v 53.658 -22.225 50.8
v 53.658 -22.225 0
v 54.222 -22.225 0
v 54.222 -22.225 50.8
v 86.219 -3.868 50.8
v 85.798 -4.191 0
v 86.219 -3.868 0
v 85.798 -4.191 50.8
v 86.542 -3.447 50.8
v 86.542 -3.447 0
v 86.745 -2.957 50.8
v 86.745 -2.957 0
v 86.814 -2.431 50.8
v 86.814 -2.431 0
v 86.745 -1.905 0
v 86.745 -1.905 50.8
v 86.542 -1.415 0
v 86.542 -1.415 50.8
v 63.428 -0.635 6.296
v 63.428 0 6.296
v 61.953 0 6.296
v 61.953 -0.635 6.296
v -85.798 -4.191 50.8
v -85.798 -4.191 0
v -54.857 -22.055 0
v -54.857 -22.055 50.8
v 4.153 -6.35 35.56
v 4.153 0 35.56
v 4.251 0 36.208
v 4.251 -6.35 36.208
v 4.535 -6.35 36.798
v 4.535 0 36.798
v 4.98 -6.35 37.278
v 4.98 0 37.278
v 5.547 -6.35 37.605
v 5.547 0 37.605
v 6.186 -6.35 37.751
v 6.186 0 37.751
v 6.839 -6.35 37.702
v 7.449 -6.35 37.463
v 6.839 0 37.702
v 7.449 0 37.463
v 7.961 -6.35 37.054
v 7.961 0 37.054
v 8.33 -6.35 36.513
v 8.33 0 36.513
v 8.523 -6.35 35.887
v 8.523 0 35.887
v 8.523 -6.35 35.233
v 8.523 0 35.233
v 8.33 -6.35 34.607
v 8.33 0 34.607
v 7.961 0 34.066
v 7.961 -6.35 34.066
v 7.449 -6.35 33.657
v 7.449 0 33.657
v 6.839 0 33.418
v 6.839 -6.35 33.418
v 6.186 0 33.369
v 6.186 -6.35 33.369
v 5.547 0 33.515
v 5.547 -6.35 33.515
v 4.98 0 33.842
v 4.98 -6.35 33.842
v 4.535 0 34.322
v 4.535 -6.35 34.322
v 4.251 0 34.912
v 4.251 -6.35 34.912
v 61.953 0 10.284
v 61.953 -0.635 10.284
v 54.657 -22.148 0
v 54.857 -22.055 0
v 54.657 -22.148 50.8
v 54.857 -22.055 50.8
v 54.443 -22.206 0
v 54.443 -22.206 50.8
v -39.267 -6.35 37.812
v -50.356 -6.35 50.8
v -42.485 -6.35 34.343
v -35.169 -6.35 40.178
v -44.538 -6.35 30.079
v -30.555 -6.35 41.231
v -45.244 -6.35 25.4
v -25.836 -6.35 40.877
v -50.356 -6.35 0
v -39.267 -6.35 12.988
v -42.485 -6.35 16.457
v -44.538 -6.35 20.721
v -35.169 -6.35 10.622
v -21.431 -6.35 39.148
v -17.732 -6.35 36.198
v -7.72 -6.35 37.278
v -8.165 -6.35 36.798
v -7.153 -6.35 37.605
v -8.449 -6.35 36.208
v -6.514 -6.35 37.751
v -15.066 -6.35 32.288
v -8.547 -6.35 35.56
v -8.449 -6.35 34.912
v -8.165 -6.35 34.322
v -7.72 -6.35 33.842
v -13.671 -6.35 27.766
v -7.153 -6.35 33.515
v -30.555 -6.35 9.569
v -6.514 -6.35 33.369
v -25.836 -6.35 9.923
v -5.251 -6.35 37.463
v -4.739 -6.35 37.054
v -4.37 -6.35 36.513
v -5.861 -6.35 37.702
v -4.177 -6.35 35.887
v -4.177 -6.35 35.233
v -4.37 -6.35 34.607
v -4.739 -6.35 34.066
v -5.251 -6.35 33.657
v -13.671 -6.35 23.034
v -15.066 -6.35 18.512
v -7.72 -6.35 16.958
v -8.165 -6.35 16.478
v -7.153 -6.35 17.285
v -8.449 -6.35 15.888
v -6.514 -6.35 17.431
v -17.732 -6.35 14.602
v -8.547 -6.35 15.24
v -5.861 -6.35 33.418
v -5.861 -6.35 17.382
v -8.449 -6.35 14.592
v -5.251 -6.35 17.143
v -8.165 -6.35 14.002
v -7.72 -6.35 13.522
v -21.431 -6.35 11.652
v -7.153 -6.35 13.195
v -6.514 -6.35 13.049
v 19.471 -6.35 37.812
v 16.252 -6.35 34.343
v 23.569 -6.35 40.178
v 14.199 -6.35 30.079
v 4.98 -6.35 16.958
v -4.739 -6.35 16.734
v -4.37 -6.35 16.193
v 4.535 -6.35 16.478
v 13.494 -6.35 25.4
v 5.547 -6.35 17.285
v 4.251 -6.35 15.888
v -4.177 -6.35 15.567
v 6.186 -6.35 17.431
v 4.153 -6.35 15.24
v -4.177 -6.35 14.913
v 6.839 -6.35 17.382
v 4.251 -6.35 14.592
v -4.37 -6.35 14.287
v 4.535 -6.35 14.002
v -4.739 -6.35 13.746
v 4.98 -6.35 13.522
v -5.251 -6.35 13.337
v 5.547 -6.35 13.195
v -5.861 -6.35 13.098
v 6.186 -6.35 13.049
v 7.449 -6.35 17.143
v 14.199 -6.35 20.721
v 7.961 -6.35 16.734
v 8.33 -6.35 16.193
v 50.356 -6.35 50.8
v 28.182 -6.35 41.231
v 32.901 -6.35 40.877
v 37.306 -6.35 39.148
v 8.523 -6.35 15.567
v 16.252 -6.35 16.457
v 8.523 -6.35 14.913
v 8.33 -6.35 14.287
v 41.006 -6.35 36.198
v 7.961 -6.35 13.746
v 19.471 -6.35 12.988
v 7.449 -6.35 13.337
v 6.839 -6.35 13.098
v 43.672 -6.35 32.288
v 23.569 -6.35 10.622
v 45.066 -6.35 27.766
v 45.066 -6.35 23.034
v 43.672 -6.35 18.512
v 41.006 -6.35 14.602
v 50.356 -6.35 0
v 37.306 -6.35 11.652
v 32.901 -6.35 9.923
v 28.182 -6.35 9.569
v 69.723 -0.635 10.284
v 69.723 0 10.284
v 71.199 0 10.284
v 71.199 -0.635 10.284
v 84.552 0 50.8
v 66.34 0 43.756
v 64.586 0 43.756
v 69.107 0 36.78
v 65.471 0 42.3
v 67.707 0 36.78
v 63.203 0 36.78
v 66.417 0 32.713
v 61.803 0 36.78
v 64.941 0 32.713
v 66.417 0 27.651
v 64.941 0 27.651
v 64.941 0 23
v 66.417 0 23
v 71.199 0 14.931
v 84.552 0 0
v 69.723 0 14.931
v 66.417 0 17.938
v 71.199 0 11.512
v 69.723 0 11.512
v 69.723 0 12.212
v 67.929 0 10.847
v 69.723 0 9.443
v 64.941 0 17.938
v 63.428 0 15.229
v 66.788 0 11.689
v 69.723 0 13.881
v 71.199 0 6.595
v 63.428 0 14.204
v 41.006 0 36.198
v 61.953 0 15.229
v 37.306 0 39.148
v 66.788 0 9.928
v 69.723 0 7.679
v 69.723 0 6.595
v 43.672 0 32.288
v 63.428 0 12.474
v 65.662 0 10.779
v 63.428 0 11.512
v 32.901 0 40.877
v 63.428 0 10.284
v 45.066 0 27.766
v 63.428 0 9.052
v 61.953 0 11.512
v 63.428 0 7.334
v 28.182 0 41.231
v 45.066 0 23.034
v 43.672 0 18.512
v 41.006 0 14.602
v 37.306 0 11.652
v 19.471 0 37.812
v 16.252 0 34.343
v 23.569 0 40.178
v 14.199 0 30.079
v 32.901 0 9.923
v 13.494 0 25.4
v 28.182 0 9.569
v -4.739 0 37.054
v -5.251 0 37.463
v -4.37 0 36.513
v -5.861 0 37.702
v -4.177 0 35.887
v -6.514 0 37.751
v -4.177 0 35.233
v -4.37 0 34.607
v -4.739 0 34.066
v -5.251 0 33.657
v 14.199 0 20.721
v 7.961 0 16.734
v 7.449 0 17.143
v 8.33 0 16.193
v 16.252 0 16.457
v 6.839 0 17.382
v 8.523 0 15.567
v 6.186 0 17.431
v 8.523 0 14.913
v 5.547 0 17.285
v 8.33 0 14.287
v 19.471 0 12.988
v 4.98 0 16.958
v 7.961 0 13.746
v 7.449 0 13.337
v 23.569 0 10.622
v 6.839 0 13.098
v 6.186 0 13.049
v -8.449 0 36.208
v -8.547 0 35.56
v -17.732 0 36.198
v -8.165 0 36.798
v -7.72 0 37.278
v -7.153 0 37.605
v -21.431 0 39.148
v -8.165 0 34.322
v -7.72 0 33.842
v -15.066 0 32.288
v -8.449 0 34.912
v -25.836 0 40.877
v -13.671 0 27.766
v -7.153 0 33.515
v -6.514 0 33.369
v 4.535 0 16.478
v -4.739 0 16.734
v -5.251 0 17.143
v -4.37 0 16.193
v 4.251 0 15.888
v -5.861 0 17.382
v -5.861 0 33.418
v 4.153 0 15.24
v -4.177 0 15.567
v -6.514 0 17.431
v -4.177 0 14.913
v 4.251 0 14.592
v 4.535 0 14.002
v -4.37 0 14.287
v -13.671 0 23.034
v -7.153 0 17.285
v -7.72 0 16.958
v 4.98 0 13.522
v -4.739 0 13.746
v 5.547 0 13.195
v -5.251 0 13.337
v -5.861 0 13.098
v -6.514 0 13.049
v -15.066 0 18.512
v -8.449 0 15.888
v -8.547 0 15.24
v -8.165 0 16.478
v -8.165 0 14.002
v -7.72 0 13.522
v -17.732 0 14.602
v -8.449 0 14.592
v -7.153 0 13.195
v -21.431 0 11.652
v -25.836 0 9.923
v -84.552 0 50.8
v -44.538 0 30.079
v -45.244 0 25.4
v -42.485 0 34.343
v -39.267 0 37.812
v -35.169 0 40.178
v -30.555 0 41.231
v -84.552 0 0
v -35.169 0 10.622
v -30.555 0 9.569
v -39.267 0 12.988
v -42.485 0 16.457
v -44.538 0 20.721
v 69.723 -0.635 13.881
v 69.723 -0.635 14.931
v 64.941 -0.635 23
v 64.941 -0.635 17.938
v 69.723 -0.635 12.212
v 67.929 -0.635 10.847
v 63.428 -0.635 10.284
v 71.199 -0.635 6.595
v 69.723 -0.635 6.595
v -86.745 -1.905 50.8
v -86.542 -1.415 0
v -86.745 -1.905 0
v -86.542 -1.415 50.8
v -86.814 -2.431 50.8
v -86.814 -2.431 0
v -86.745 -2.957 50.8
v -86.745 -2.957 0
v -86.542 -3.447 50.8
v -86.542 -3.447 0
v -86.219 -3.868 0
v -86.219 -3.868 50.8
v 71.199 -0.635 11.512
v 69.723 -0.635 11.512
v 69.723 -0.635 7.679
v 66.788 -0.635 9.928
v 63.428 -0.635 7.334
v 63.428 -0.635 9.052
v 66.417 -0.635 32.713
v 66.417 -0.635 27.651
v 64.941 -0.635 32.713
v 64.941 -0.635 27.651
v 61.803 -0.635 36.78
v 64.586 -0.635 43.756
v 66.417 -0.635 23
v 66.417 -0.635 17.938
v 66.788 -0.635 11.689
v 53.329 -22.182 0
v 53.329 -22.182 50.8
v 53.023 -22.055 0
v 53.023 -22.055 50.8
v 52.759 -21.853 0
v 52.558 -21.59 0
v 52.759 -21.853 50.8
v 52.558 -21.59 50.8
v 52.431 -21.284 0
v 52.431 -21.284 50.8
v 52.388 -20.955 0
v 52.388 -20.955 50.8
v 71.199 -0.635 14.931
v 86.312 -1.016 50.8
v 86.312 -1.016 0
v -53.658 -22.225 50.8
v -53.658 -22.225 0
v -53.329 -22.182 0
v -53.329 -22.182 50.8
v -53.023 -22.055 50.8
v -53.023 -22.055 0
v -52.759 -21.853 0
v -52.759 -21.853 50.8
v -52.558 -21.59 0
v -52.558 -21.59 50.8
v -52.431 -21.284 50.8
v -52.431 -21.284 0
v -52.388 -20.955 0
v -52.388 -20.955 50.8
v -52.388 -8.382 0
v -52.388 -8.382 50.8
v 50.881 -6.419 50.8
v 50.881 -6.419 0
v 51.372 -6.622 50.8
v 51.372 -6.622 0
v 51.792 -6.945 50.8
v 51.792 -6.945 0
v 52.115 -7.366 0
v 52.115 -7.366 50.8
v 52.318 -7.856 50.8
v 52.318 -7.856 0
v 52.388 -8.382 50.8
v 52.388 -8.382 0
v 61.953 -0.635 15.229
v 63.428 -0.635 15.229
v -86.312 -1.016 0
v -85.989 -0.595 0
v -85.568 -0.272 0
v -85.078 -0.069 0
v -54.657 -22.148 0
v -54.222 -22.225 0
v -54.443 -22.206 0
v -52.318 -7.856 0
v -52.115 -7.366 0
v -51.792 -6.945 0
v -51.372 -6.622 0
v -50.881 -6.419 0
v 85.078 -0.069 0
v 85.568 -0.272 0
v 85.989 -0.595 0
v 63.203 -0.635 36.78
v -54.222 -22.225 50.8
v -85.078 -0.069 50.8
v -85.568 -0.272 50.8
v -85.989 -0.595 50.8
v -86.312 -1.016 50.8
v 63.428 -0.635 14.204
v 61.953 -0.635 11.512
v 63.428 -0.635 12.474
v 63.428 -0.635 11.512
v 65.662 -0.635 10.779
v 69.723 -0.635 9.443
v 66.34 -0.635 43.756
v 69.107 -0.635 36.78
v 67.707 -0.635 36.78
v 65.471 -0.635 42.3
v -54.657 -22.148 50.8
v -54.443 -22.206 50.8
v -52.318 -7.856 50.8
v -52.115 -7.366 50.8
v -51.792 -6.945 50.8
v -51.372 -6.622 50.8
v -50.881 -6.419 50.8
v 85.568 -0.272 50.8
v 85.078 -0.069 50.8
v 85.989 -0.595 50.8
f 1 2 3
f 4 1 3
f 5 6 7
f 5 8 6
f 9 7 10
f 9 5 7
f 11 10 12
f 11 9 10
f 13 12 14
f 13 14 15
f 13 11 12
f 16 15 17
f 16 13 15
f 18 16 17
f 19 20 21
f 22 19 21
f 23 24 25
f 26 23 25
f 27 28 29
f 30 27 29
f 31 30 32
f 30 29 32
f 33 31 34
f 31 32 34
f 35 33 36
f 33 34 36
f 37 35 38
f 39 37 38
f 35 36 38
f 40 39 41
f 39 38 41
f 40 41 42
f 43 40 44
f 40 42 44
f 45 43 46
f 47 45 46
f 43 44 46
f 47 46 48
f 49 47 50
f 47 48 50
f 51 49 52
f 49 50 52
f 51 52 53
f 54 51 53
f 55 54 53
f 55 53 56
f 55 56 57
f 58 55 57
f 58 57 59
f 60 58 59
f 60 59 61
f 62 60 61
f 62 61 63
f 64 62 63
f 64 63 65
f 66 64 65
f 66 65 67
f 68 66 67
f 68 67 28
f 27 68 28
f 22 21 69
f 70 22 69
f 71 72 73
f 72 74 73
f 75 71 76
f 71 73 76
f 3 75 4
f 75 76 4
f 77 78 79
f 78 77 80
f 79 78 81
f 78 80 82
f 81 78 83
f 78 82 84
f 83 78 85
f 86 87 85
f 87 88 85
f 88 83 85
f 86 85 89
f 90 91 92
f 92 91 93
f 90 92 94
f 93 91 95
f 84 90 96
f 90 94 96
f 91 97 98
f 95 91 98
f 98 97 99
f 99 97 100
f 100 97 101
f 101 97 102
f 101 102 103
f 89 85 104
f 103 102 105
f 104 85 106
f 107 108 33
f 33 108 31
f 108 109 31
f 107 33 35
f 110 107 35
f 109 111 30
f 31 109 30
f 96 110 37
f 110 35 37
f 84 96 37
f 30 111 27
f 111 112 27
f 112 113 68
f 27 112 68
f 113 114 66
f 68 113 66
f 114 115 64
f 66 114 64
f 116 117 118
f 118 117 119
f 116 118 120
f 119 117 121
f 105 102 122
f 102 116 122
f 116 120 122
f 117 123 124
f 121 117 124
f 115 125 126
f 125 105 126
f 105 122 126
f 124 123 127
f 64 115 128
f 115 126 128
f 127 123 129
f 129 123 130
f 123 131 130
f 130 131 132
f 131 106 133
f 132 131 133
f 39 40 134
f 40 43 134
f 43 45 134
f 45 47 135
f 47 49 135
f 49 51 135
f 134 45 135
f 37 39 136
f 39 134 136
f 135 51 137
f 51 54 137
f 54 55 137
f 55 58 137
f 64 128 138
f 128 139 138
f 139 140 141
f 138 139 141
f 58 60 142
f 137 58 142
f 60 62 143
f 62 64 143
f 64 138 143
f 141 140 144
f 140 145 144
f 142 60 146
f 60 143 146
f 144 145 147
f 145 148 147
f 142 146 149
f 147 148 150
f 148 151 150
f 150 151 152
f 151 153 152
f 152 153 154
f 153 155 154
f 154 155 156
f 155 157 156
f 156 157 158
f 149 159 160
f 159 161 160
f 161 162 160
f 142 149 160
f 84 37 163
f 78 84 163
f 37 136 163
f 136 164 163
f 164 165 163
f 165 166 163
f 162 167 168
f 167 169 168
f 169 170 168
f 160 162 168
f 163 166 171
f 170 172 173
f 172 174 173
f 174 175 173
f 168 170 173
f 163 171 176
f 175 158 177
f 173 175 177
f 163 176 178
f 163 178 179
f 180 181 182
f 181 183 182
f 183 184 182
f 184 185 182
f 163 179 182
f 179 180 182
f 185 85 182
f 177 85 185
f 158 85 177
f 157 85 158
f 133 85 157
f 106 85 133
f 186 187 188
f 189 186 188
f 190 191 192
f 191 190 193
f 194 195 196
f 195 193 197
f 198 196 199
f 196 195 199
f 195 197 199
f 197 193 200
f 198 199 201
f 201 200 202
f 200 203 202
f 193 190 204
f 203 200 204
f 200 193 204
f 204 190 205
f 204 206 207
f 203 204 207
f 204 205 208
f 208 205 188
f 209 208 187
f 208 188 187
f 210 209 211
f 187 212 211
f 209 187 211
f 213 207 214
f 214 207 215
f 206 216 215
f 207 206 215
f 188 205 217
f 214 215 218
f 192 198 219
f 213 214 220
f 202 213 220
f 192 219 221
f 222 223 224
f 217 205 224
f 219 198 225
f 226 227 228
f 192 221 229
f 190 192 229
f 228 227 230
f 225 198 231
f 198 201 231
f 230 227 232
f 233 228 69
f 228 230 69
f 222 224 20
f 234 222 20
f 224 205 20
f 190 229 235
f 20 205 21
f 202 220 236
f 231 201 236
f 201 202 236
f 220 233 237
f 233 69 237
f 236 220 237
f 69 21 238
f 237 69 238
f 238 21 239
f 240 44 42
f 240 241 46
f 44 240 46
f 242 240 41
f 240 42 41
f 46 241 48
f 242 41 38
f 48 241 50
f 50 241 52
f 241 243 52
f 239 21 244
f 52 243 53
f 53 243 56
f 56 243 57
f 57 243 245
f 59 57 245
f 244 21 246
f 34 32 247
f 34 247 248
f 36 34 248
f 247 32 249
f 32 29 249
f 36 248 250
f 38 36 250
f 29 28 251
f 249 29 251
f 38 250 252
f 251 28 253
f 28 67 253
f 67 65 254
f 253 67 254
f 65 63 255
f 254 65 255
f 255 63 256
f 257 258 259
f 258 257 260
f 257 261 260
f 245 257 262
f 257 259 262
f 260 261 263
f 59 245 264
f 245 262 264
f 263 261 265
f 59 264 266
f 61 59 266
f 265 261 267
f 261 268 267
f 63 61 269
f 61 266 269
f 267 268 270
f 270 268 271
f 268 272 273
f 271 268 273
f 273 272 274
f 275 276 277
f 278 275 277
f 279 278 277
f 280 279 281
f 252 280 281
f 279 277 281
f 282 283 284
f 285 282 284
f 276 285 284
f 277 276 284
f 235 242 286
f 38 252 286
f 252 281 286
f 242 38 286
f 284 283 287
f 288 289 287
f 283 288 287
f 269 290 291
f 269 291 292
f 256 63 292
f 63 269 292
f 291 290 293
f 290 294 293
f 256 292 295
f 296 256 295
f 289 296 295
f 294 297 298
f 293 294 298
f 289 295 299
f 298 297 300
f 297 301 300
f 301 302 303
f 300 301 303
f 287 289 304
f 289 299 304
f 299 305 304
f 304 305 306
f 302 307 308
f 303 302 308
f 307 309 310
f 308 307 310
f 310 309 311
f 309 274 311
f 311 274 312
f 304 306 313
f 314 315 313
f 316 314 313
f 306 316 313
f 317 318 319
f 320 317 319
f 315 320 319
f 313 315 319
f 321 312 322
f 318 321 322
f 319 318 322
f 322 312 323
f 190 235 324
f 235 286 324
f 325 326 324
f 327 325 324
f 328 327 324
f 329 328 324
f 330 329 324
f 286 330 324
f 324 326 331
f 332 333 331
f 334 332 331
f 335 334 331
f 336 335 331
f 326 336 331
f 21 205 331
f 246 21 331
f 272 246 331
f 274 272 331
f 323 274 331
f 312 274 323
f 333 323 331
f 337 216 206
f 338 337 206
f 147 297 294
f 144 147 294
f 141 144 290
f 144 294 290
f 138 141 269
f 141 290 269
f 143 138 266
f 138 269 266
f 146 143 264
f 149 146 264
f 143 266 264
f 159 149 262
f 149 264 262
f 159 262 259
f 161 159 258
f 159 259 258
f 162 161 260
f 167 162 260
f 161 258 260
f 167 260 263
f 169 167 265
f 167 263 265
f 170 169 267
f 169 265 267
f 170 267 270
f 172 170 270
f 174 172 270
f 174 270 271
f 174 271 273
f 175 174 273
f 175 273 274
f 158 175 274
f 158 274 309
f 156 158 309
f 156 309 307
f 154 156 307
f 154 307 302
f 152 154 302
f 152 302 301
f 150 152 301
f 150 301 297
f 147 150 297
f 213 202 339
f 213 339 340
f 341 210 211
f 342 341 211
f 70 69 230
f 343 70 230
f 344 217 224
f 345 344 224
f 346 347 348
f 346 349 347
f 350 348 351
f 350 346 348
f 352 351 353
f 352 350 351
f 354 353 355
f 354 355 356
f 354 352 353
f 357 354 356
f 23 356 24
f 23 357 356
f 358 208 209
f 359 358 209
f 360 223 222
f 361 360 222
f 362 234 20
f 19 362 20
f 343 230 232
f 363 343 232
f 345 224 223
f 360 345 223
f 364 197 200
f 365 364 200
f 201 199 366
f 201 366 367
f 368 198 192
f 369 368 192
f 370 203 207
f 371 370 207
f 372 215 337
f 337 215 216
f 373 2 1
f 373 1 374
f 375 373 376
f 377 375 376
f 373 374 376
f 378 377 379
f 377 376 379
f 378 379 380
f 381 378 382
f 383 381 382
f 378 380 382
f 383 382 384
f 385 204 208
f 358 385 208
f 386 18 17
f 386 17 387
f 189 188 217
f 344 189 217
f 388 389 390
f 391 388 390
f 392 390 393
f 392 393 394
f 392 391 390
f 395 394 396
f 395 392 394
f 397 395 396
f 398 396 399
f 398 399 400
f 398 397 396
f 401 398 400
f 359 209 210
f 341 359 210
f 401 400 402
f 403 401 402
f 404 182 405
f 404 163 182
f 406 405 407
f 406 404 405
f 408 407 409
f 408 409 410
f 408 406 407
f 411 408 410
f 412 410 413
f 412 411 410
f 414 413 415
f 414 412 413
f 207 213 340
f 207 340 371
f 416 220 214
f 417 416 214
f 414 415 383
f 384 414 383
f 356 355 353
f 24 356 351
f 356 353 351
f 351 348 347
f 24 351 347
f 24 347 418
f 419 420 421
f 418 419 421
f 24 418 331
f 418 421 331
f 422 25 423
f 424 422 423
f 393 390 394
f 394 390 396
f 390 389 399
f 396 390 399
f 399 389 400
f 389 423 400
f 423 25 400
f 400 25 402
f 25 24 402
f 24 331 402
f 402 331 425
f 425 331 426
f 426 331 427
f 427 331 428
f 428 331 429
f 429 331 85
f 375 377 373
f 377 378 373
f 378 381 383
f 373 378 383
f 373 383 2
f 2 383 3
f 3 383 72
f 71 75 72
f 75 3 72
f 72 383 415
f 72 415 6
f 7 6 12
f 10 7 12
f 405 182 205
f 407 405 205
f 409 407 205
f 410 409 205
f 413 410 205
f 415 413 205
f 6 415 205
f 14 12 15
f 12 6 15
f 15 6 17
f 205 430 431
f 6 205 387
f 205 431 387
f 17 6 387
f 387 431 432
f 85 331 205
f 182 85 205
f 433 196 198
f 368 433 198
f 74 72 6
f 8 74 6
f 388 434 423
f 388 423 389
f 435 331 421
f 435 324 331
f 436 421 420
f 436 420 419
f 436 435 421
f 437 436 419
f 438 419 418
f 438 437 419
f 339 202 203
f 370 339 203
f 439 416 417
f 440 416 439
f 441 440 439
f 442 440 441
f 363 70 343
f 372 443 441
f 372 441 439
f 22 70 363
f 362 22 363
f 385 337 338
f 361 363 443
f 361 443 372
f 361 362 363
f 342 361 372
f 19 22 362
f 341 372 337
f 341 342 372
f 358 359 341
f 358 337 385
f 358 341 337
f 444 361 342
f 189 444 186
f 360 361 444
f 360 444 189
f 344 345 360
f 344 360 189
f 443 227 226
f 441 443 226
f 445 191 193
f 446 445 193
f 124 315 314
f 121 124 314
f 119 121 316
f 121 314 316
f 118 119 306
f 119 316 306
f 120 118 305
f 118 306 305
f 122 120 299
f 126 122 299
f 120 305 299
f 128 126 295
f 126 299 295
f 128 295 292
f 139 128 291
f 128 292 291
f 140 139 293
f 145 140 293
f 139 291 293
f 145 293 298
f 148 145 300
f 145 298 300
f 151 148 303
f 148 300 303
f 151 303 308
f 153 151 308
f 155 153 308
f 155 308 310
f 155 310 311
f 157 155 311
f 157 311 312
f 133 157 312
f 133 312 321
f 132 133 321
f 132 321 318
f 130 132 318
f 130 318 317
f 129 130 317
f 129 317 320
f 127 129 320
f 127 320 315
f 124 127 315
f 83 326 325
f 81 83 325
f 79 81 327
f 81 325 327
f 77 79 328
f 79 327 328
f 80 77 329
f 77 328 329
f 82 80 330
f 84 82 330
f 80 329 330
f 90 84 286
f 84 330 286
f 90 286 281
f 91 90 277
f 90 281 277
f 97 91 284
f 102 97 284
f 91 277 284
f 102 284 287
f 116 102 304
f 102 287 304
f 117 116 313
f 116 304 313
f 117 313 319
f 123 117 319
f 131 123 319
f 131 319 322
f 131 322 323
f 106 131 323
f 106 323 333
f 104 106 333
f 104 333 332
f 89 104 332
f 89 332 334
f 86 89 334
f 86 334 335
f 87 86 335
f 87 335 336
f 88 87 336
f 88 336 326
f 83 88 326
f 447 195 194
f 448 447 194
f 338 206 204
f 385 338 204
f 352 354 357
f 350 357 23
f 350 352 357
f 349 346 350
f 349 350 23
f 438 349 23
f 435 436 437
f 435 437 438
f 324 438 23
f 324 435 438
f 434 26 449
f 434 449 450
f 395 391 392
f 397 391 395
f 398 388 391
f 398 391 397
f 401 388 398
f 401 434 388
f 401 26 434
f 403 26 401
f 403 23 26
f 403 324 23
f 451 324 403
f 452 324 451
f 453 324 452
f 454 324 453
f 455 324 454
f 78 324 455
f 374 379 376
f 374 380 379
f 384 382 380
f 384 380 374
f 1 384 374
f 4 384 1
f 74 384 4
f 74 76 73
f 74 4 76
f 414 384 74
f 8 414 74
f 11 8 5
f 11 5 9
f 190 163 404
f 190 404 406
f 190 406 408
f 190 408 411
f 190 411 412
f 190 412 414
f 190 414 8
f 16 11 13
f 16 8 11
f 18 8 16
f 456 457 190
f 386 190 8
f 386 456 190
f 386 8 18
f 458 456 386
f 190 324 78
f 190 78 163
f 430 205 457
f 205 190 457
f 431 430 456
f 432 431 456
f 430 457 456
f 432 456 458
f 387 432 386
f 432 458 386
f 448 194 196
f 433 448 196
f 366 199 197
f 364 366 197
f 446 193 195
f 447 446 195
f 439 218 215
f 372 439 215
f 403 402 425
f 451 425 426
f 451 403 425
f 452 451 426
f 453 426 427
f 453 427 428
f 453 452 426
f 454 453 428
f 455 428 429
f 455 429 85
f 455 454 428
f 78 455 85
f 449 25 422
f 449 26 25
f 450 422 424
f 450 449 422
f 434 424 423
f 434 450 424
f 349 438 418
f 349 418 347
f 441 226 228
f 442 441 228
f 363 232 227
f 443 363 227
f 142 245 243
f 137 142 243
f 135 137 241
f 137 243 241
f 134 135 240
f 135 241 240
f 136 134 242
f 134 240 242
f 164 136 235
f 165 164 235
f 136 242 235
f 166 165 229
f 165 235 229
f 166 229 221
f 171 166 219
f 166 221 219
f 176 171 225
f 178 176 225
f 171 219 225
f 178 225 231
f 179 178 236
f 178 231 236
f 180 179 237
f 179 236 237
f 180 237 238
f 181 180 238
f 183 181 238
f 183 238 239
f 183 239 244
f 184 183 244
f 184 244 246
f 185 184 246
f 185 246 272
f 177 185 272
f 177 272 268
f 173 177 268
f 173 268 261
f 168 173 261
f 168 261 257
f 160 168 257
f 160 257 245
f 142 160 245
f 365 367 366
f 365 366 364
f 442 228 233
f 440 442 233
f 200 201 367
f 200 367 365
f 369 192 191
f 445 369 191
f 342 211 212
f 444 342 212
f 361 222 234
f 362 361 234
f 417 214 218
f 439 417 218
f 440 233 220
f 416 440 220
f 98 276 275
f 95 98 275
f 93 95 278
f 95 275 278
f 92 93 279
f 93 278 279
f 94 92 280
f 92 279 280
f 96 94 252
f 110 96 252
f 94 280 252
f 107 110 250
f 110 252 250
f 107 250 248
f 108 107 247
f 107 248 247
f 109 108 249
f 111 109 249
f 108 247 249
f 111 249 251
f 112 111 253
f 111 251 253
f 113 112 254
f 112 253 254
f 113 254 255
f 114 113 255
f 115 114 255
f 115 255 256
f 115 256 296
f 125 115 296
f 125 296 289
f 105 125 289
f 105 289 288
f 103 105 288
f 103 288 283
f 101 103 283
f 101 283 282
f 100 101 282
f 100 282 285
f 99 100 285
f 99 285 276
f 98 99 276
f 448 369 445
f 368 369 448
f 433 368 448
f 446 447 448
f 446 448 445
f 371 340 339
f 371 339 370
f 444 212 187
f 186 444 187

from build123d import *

# Parameters (mm, degrees)
BOSS_EXTRUDE1_DEPTH = 50.8
FILLET1_R           = 2.032
FILLET2_R           = 1.27
SKETCH2_R           = 2.1971
SKETCH2_R_2         = 15.875
CUT_EXTRUDE1_DEPTH  = 104.011248837
SKETCH3_W           = 1.47561847
SKETCH3_H           = 5.061923893
CUT_EXTRUDE2_DEPTH  = 0.635


with BuildPart() as part:
    # Sketch1 → Boss-Extrude1 (new body)
    with BuildSketch(Plane.XY):
        Polygon((85.725, 0), (-85.725, 0), (-87.558087105, -3.175), (-54.56251922, -22.225), (-52.3875, -22.225), (-52.3875, -6.35), (52.3875, -6.35), (52.3875, -22.225), (54.56251922, -22.225), (87.558087105, -3.175), align=None)
    extrude(amount=BOSS_EXTRUDE1_DEPTH)

    # Fillet1
    fillet1_edges = [part.edges().sort_by_distance(p)[0] for p in [
        (-85.725, 0, 25.4),
        (85.725, 0, 25.4),
        (87.558087105, -3.175, 25.4),
        (52.3875, -6.35, 25.4),
        (-52.3875, -6.35, 25.4),
        (-87.558087105, -3.175, 25.4),
    ]]
    fillet(fillet1_edges, radius=FILLET1_R)

    # Fillet2
    fillet2_edges = [part.edges().sort_by_distance(p)[0] for p in [
        (54.56251922, -22.225, 25.4),
        (52.3875, -22.225, 25.4),
        (-52.3875, -22.225, 25.4),
        (-54.56251922, -22.225, 25.4),
    ]]
    fillet(fillet2_edges, radius=FILLET2_R)

    # Sketch2 → Cut-Extrude1 (cut, through all)
    with BuildSketch(Plane(origin=(0, 0, 0), x_dir=(1, 0, 0), z_dir=(0, 1, 0))):
        with Locations(Location((6.35, -35.56, 0), (0, 0, 180))):
            Circle(SKETCH2_R)
        with Locations(Location((-6.35, -35.56, 0), (0, 0, 180))):
            Circle(SKETCH2_R)
        with Locations(Location((-6.35, -15.24, 0), (0, 0, 180))):
            Circle(SKETCH2_R)
        with Locations(Location((6.35, -15.24, 0), (0, 0, 180))):
            Circle(SKETCH2_R)
        with Locations(Location((29.36875, -25.4, 0), (0, 0, 180))):
            Circle(SKETCH2_R_2)
        with Locations(Location((-29.36875, -25.4, 0), (0, 0, 180))):
            Circle(SKETCH2_R_2)
    extrude(amount=-CUT_EXTRUDE1_DEPTH, mode=Mode.SUBTRACT)

    # Sketch3 → Cut-Extrude2 (cut)
    with BuildSketch(Plane(origin=(0, 0, 0), x_dir=(1, 0, 0), z_dir=(0, 1, 0))):
        Polygon((61.952737106, -15.22945322), (63.428353296, -15.22945322), (63.428353296, -14.204150233), (66.787671186, -11.688640612), (69.723065901, -13.881379712), (69.723065901, -14.930594244), (71.198684372, -14.930594244), (71.198684372, -11.512394715), (69.723065901, -11.512394715), (69.723065901, -12.211960755), (67.929186974, -10.847171738), (69.723065901, -9.442854683), (69.723065901, -10.284273394), (71.198684372, -10.284273394), (71.198684372, -6.595230639), (69.723065901, -6.595230639), (69.723065901, -7.679269337), (66.787671186, -9.928245145), (63.428353296, -7.333914297), (63.428353296, -6.296371664), (61.952737106, -6.296371664), (61.952737106, -10.284273394), (63.428353296, -10.284273394), (63.428353296, -9.052344284), (65.662462767, -10.778941636), (63.428353296, -12.473735972), (63.428353296, -11.512394715), (61.952737106, -11.512394715), align=None)
        with Locations((65.679133813, -20.468824629)):
            Rectangle(SKETCH3_W, SKETCH3_H)
        with Locations((65.679133813, -30.181741323)):
            Rectangle(SKETCH3_W, SKETCH3_H)
        Polygon((64.586217495, -43.756476338), (66.339613015, -43.756476338), (69.106673825, -36.779987136), (67.706939797, -36.779987136), (65.470958353, -42.299591277), (63.202804515, -36.779987136), (61.803305338, -36.779987136), align=None)
    extrude(amount=-CUT_EXTRUDE2_DEPTH, mode=Mode.SUBTRACT)


solid = part.part
